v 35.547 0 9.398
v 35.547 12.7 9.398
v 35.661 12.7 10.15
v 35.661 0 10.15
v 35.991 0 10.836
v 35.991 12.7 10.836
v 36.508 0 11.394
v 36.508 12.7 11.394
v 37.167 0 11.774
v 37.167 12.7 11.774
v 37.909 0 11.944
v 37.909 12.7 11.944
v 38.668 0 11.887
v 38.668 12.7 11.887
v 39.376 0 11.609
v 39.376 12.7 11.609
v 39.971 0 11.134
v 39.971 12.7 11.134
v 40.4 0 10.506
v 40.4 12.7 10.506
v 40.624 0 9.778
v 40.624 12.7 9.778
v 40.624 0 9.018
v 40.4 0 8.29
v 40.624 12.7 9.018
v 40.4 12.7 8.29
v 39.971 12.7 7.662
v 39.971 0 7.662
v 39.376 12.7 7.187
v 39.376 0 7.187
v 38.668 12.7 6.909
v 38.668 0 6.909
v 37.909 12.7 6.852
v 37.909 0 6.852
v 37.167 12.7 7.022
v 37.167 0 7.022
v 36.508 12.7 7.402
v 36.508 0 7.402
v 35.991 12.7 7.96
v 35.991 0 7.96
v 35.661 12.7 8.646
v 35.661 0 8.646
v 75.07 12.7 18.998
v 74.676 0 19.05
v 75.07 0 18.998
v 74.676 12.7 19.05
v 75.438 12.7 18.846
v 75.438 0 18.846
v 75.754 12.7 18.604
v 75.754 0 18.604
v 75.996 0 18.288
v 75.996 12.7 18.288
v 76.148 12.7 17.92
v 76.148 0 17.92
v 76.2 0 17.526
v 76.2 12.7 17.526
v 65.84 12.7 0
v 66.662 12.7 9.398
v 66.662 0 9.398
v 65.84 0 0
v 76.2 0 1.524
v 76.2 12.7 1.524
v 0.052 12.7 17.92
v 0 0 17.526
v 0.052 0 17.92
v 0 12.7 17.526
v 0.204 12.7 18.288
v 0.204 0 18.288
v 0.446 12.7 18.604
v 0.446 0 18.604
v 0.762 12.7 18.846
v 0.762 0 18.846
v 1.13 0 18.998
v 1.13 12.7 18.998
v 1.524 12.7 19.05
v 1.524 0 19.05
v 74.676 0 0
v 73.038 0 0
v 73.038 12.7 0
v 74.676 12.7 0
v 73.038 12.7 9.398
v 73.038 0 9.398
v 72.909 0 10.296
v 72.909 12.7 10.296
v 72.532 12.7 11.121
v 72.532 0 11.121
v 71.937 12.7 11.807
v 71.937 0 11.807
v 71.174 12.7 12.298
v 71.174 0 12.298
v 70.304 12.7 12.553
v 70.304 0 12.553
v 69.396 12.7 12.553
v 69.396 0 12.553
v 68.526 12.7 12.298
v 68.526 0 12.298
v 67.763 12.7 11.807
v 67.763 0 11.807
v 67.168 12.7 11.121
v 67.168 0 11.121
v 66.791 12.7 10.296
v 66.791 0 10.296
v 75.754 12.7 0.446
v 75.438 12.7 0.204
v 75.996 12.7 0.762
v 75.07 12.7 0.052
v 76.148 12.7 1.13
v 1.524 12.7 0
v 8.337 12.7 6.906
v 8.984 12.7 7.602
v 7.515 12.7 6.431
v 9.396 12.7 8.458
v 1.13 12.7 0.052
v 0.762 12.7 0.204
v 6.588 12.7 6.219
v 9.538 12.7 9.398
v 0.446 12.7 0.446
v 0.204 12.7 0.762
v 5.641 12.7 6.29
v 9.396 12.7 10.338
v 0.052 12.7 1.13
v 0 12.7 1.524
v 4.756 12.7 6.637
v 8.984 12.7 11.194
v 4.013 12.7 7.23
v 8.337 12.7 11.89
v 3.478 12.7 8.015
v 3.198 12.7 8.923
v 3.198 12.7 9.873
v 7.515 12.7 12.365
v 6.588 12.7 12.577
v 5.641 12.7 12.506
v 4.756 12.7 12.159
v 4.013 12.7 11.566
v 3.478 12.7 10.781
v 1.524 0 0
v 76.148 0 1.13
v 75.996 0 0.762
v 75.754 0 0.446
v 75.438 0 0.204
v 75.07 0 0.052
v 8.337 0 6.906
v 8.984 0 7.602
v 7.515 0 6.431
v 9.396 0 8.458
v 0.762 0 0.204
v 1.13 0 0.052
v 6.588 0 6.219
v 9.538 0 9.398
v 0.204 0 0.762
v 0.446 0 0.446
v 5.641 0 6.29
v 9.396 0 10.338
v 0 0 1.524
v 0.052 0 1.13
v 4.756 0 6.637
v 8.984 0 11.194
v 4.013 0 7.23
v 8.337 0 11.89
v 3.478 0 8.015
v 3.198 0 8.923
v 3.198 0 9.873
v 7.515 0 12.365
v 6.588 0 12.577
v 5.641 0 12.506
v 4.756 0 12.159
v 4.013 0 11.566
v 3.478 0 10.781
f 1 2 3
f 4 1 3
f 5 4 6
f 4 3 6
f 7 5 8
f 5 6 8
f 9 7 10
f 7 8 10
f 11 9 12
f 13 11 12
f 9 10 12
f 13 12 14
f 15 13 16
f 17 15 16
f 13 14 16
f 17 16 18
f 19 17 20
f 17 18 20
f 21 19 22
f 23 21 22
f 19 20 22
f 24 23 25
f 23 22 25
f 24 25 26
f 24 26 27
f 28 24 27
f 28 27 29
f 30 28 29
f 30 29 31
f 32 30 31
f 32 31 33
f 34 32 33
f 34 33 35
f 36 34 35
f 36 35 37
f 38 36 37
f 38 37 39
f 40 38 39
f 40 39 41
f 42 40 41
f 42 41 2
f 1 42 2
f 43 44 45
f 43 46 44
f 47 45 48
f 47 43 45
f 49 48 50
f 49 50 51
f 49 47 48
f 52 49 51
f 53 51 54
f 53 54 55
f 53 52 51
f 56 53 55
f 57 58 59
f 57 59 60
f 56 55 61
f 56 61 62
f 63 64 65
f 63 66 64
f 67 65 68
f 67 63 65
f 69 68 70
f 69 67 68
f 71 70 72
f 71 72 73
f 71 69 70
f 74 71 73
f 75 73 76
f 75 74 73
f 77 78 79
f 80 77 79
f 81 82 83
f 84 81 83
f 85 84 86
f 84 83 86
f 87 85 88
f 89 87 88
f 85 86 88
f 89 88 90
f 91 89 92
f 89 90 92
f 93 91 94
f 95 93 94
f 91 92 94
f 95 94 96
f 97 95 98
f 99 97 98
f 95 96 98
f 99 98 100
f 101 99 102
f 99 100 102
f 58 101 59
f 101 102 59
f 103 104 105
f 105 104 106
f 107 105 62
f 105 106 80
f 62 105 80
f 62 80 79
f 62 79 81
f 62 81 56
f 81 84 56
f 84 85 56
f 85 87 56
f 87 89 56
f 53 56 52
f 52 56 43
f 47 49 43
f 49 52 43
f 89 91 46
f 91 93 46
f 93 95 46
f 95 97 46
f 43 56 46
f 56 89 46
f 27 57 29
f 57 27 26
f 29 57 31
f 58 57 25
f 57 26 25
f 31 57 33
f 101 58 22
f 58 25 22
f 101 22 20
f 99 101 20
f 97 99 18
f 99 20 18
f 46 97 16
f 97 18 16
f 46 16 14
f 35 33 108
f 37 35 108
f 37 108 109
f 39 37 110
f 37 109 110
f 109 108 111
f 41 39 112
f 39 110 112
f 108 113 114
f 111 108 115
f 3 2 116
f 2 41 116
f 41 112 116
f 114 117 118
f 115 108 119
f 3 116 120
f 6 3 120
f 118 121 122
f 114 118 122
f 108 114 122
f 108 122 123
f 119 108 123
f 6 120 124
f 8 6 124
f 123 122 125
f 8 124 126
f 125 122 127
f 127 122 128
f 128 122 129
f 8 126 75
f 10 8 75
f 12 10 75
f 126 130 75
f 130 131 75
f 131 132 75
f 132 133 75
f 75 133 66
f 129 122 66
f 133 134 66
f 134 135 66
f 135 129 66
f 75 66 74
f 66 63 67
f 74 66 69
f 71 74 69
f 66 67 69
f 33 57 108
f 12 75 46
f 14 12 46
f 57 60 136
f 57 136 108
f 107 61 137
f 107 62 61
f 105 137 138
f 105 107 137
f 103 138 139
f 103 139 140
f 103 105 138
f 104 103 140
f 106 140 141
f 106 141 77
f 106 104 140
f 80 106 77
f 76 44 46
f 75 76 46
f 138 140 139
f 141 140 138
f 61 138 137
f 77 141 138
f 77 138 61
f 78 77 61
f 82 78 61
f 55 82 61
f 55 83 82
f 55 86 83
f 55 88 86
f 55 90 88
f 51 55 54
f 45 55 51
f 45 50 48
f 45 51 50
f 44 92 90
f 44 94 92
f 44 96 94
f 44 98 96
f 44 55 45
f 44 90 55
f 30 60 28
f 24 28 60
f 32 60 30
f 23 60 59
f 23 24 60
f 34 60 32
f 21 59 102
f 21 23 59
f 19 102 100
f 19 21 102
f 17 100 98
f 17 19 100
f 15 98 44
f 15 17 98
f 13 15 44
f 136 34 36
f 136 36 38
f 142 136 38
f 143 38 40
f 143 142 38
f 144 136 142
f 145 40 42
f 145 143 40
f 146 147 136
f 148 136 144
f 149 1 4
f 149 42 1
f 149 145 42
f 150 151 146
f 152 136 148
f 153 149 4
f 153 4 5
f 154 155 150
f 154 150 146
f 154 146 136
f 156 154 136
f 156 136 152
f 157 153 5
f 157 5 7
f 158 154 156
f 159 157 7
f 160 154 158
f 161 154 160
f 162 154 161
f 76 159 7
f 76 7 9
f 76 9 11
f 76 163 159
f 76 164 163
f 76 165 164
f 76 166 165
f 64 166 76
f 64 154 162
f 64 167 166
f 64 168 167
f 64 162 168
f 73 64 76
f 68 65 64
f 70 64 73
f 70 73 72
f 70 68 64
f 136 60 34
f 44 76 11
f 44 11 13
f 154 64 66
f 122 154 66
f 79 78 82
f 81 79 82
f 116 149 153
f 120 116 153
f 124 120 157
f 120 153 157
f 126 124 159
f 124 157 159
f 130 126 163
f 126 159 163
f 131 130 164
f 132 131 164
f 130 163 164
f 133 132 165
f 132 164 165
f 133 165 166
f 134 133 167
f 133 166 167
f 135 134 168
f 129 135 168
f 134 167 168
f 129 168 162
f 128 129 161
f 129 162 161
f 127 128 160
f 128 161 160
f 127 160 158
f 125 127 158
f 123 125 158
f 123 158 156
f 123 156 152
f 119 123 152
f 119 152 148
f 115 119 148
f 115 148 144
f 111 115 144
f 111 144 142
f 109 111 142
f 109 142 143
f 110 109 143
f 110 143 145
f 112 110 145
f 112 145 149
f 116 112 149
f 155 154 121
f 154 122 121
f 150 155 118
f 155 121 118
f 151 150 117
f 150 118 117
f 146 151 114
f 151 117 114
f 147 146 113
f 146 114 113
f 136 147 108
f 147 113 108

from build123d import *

# Parameters (mm, degrees)
F0_W     = 12.7
F0_H     = 19.05
F1_DEPTH = 76.2
F3_DEPTH = 25.4
F4_D     = 5.1054
F5_R     = 1.524


with BuildPart() as f1:
    # F0 (on Right) → F1 (new body)
    with BuildSketch(Plane.YZ):
        with Locations((6.35, 9.525)):
            Rectangle(F0_W, F0_H)
    extrude(amount=F1_DEPTH)

    # F2 (on face) → F3 (cut)
    with BuildSketch(Plane.XZ):
        with BuildLine():
            Line((6.35, 9.398), (3.1623, 9.398))
            ThreePointArc((3.1623, 9.398), (6.35, 6.2103), (9.5377, 9.398))
            Line((9.5377, 9.398), (6.35, 9.398))
        make_face()
        with BuildLine():
            Line((66.6623, 9.398), (65.8400815402, 0))
            Line((65.8400815402, 0), (73.0377, 0))
            Line((73.0377, 0), (73.0377, 9.398))
            ThreePointArc((73.0377, 9.398), (69.85, 12.5857), (66.6623, 9.398))
        make_face()
        with BuildLine():
            ThreePointArc((9.5377, 9.398), (6.35, 12.5857), (3.1623, 9.398))
            Line((3.1623, 9.398), (6.35, 9.398))
            Line((6.35, 9.398), (9.5377, 9.398))
        make_face()
    extrude(amount=-F3_DEPTH, mode=Mode.SUBTRACT)

    # F4 (through all)
    with Locations(Plane.XZ):
        with Locations((38.1, 9.398)):
            Hole(F4_D / 2)

    # F5
    f5_edges = [f1.edges().sort_by_distance(p)[0] for p in [
        (76.2, 6.35, 19.05),
        (0, 6.35, 19.05),
        (76.2, 6.35, 0),
        (0, 6.35, 0),
    ]]
    fillet(f5_edges, radius=F5_R)


solid = f1.part
